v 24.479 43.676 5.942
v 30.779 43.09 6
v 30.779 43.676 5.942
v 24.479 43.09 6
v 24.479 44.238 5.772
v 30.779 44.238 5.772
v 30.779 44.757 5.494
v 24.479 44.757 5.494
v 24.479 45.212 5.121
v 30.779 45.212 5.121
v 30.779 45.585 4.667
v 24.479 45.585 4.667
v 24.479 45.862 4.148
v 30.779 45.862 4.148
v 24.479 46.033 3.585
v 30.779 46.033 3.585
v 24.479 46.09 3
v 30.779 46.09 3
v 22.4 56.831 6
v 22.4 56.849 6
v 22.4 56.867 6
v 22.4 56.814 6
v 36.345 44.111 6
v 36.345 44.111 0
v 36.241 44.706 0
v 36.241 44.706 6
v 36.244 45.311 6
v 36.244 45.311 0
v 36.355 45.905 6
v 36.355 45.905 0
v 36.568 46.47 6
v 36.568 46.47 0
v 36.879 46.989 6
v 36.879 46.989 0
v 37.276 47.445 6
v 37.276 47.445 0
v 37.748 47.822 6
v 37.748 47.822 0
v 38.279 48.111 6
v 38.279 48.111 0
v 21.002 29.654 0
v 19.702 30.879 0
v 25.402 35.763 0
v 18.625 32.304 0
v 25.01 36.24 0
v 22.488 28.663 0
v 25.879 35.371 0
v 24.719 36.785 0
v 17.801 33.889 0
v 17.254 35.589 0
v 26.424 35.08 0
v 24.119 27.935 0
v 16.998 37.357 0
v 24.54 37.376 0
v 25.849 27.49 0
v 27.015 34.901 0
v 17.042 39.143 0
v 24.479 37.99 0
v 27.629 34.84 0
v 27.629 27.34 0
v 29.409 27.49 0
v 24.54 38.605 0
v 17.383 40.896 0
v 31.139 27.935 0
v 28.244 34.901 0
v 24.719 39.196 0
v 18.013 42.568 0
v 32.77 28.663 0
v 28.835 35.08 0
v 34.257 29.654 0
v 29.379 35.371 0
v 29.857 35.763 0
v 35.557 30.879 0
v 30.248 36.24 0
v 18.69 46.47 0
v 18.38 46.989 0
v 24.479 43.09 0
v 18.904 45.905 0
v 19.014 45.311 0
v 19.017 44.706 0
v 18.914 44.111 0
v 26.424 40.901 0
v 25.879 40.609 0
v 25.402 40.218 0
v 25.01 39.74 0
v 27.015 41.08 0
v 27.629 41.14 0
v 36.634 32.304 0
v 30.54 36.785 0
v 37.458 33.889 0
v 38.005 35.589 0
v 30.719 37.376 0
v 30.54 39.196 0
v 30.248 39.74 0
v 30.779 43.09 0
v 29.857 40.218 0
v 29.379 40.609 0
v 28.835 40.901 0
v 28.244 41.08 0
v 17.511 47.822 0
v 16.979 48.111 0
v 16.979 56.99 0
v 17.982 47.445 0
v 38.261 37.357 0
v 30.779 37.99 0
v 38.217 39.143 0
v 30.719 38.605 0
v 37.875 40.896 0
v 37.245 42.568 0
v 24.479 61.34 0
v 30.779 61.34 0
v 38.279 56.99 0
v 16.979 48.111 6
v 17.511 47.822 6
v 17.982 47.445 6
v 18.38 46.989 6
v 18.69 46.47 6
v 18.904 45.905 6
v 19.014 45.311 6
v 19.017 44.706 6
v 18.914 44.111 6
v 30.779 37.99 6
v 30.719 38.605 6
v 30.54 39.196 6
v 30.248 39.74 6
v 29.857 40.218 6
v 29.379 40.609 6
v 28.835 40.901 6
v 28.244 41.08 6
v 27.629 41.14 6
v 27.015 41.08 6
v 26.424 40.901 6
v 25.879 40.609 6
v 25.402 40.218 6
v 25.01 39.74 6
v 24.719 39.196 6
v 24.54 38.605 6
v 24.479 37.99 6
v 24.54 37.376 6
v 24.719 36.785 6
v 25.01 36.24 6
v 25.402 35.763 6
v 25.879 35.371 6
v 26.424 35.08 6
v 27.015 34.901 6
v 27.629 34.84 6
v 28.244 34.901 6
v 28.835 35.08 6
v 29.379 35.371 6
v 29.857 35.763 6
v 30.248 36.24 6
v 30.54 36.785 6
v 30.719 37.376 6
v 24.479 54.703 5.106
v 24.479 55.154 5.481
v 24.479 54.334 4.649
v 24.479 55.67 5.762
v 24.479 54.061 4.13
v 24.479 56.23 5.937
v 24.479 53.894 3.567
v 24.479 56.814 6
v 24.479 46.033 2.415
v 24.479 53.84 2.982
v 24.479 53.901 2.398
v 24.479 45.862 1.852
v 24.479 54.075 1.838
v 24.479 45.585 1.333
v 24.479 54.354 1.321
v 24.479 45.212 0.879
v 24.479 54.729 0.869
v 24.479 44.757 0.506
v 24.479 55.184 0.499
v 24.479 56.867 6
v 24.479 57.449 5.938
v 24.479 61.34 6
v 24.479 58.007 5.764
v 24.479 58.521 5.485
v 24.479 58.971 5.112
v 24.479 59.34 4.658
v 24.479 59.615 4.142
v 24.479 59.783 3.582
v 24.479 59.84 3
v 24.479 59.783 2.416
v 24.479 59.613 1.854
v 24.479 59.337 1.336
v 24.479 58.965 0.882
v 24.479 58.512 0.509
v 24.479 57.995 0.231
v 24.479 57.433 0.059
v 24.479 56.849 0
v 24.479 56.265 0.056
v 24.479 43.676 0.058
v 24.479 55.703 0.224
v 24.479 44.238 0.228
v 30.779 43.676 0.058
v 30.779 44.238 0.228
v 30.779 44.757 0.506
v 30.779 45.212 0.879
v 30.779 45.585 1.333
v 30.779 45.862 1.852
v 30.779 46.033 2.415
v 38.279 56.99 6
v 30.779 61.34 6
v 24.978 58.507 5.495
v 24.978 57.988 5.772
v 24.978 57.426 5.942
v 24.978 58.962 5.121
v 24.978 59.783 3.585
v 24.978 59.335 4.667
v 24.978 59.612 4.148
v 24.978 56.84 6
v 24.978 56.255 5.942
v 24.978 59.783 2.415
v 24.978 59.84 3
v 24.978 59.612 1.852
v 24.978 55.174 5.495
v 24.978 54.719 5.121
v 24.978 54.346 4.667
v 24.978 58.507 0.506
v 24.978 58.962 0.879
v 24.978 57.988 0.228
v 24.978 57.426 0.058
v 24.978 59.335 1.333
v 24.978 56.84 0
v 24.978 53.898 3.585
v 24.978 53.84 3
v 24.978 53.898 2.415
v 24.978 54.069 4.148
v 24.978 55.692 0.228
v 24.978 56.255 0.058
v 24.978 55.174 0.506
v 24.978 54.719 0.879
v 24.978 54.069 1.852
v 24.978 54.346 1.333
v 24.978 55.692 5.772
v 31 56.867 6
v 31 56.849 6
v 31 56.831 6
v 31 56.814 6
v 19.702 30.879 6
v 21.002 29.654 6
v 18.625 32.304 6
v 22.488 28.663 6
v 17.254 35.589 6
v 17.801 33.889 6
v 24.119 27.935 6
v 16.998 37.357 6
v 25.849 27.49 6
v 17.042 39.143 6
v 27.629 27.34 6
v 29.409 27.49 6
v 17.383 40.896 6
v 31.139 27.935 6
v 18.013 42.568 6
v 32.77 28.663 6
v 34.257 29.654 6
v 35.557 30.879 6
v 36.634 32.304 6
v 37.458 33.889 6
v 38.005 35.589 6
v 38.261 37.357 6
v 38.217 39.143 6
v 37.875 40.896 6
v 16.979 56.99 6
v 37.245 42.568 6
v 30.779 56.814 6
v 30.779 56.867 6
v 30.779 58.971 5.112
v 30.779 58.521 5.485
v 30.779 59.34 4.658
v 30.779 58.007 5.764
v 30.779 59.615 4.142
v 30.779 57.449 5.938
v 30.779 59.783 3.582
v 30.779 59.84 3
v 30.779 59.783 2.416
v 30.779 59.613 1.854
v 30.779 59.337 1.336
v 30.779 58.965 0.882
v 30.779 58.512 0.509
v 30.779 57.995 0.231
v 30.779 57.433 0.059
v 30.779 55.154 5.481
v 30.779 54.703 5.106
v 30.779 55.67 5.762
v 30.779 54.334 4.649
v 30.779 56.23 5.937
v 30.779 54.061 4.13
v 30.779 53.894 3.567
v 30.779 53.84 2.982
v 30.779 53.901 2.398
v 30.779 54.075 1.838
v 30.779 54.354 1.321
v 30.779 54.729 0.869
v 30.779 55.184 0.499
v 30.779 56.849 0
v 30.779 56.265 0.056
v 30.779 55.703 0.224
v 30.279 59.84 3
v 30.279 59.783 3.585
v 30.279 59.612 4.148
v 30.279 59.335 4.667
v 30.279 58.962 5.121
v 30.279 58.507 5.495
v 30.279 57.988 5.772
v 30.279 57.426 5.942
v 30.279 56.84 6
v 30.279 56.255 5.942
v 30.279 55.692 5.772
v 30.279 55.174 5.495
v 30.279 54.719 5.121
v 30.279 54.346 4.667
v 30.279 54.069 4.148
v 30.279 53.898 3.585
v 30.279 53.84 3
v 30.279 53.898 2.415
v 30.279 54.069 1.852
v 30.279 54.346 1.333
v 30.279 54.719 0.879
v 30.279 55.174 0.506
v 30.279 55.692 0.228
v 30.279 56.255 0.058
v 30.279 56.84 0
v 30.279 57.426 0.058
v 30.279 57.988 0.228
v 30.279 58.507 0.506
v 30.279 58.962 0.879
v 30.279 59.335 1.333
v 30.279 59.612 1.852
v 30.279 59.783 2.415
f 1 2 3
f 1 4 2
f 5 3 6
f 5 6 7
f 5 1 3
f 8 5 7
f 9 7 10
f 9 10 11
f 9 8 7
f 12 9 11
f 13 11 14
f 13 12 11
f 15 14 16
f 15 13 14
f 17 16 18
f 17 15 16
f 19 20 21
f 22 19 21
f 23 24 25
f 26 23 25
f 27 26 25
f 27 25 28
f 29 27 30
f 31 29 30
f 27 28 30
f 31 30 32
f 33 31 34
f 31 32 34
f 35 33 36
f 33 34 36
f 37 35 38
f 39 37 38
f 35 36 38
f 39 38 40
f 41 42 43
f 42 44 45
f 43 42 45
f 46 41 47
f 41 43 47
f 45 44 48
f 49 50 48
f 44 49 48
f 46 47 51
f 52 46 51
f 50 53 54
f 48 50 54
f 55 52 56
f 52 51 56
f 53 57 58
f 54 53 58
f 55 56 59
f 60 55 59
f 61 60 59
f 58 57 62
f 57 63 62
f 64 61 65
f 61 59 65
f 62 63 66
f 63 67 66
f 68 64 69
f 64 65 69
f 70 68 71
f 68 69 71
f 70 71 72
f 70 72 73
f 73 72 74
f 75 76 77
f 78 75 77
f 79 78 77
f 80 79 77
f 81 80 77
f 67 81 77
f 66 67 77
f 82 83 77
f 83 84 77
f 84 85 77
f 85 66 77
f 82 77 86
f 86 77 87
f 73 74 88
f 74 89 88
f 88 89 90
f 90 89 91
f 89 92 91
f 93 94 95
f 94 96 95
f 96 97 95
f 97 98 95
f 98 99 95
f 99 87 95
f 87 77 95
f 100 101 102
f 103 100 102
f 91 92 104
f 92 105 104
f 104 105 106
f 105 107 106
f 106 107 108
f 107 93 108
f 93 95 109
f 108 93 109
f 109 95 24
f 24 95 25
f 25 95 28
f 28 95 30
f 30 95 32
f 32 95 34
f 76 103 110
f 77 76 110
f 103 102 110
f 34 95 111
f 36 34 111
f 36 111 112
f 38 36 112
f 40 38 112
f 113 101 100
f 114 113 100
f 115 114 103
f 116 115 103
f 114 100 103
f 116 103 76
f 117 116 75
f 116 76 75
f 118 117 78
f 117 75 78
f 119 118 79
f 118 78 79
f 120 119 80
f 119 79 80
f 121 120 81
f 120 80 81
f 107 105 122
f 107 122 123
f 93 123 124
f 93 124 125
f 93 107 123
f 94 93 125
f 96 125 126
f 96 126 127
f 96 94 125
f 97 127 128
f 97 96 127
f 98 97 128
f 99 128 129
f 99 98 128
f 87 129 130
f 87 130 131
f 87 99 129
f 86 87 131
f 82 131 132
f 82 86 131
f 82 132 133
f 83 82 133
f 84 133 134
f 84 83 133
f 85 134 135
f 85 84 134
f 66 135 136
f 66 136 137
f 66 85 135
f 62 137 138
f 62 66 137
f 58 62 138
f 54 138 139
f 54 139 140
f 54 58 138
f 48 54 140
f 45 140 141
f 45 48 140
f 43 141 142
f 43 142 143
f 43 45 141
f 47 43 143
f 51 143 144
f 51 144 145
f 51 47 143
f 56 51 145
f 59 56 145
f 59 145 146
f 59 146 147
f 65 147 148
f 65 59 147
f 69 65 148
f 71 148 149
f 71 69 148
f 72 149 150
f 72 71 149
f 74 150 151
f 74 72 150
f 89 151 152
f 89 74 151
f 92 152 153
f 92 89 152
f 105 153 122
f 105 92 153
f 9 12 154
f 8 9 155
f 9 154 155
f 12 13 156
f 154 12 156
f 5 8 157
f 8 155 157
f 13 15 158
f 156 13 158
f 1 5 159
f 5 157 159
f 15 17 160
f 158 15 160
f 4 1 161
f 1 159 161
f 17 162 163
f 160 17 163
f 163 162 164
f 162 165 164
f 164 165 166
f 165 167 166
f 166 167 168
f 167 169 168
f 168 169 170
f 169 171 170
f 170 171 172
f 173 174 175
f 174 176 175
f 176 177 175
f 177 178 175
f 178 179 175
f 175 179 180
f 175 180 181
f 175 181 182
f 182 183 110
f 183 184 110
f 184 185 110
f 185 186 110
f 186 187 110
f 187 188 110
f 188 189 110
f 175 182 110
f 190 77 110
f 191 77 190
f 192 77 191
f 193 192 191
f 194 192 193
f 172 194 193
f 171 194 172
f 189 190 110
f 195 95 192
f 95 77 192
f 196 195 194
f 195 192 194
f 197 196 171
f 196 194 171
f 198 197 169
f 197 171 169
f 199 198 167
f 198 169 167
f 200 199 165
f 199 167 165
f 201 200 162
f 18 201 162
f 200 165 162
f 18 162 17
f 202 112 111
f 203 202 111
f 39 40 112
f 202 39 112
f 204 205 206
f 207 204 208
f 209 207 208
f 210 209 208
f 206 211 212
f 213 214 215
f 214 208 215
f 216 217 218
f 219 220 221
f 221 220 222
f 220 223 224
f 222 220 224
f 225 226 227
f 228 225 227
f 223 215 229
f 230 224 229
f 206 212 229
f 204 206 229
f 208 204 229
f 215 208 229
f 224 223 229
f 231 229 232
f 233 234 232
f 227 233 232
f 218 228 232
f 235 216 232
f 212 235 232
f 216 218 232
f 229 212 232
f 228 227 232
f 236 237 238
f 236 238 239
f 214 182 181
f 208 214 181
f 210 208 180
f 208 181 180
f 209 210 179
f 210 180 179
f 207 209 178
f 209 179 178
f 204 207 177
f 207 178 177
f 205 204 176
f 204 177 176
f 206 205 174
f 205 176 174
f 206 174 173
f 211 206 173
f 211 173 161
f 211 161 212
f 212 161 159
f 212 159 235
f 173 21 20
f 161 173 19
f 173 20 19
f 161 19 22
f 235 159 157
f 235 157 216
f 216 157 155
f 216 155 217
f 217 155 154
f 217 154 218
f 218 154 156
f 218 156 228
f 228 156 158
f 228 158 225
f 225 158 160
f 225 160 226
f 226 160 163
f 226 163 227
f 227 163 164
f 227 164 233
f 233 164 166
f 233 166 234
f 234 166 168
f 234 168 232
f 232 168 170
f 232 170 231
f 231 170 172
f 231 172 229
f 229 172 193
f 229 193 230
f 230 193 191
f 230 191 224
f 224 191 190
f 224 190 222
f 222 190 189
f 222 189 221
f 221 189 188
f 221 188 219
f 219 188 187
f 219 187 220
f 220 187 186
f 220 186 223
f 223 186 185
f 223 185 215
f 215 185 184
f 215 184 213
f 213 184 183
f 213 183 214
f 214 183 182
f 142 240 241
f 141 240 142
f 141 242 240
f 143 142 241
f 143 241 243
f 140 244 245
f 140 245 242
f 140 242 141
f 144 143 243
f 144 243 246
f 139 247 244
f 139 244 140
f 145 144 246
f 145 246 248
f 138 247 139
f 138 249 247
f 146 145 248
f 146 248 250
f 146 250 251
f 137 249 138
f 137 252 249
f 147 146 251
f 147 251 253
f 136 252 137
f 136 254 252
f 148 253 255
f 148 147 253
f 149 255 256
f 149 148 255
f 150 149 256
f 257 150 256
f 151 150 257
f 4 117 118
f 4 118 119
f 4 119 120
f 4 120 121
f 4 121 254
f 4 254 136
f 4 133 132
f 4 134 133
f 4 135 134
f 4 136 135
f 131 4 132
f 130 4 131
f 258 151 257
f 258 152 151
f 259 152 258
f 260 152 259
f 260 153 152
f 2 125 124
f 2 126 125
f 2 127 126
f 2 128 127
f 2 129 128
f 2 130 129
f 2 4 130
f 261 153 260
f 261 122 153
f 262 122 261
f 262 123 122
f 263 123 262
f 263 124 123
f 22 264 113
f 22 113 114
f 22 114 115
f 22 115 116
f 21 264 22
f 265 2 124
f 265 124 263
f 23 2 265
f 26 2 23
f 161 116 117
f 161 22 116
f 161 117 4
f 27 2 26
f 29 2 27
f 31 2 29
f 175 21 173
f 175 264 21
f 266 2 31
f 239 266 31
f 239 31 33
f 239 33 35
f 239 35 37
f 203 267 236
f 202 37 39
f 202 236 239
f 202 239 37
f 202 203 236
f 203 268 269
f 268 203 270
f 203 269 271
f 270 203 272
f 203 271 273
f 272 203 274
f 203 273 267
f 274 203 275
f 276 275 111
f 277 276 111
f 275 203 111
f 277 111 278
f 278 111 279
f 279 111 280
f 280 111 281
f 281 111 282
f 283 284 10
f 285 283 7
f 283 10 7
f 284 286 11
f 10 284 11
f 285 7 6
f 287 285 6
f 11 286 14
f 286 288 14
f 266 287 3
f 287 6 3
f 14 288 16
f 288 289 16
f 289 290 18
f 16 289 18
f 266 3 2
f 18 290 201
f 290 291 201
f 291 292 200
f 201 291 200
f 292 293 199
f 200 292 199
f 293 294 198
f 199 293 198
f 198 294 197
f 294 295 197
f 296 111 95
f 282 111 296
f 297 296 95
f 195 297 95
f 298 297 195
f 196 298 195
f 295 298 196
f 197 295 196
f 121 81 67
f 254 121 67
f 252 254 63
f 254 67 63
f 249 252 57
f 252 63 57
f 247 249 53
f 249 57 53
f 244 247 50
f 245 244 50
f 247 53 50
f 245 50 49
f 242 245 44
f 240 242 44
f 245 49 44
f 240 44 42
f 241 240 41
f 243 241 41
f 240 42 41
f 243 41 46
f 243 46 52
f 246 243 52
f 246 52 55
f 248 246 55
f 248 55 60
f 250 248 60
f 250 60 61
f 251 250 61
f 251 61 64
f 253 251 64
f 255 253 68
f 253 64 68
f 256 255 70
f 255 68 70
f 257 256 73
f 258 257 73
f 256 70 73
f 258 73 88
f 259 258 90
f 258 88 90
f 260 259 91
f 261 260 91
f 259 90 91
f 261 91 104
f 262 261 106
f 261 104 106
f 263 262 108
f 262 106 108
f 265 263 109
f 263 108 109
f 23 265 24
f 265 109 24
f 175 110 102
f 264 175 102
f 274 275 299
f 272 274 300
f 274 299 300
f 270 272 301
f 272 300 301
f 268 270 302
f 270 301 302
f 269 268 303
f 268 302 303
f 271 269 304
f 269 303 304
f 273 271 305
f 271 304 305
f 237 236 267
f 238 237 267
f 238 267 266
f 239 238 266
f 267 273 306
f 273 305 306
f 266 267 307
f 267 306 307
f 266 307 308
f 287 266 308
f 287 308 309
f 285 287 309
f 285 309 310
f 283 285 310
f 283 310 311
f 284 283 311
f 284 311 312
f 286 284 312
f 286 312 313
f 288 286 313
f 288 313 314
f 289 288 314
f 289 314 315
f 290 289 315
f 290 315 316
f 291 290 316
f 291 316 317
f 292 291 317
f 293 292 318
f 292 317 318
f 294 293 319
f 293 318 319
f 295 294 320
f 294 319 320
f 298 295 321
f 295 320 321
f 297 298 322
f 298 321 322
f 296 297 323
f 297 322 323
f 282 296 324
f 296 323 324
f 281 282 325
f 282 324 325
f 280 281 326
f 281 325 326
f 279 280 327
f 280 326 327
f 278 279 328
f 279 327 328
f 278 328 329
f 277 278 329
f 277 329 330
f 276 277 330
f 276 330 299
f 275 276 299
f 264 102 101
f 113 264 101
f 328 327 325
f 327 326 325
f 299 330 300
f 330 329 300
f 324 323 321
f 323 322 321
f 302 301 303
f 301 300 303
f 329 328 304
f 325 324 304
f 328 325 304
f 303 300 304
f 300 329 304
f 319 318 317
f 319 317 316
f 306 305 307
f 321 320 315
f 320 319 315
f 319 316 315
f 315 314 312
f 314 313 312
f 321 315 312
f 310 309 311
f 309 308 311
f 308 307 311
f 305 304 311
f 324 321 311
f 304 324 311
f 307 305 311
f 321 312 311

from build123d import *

# Parameters (mm, degrees)
F0_R     = 3.15
F1_DEPTH = 6
F3_START = 22.4
F2_R     = 3
F3_DEPTH = 8.6
F5_START = -52.7
F5_DEPTH = 11
F6_R     = 3
F7_R     = 2.99999


# Not quite as in the source:
# - a fillet or chamfer is up to 0.001 mm smaller than in the source, because OpenCascade refuses the exact size


with BuildPart() as f1:
    # F0 (on Top) → F1 (new body)
    with BuildSketch(Plane.XY):
        with BuildLine():
            Line((24.4793512434, 46.0903614521), (24.4793512434, 48.1638564268))
            ThreePointArc((24.4793512434, 48.1638564268), (21.3598687714, 46.599431642), (18.9135639574, 44.1106189618))
            ThreePointArc((18.9135639574, 44.1106189618), (27.6293512434, 27.3403614521), (36.3451385294, 44.1106189618))
            ThreePointArc((36.3451385294, 44.1106189618), (33.8988337153, 46.599431642), (30.7793512434, 48.1638564268))
            Line((30.7793512434, 48.1638564268), (30.7793512434, 46.0903614521))
            Line((30.7793512434, 46.0903614521), (27.6293512434, 46.0903614521))
            Line((27.6293512434, 46.0903614521), (24.4793512434, 46.0903614521))
        make_face()
        with Locations((27.6293512434, 37.9903614521)):
            Circle(F0_R, mode=Mode.SUBTRACT)
        with BuildLine():
            ThreePointArc((18.9135639574, 44.1106189618), (21.3598687714, 46.599431642), (24.4793512434, 48.1638564268))
            Line((24.4793512434, 48.1638564268), (24.4793512434, 61.3403614521))
            Line((24.4793512434, 61.3403614521), (16.9793512434, 56.9903614521))
            Line((16.9793512434, 56.9903614521), (16.9793512434, 48.1108582074))
            ThreePointArc((16.9793512434, 48.1108582074), (18.6903086712, 46.4704086219), (18.9135639574, 44.1106189618))
        make_face()
        with BuildLine():
            ThreePointArc((30.7793512434, 48.1638564268), (33.8988337153, 46.599431642), (36.3451385294, 44.1106189618))
            ThreePointArc((36.3451385294, 44.1106189618), (36.5683938155, 46.4704086219), (38.2793512434, 48.1108582074))
            Line((38.2793512434, 48.1108582074), (38.2793512434, 56.9903614521))
            Line((38.2793512434, 56.9903614521), (30.7793512434, 61.3403614521))
            Line((30.7793512434, 61.3403614521), (30.7793512434, 48.1638564268))
        make_face()
    extrude(amount=F1_DEPTH)

    # F2 (on Right) → F3 (join)
    with BuildSketch(Plane.YZ.offset(F3_START)):
        with Locations((56.8403841853, 3.0001187697)):
            Circle(F2_R)
    extrude(amount=F3_DEPTH)

    # F4 (on Front) → F5 (cut)
    with BuildSketch(Plane.XZ.offset(F5_START)):
        Polygon((30.2794827968, -0.6592939026), (30.2794827968, 3.0006368179), (30.2794827968, 6.7412233911), (24.9780313224, 6.7412233911), (24.9780313224, -0.6592939026), align=None)
    extrude(amount=-F5_DEPTH, mode=Mode.SUBTRACT)

    # F6
    f6_edges = [f1.edges().sort_by_distance(p)[0] for p in [
        (27.629351, 46.090361, 6),
    ]]
    fillet(f6_edges, radius=F6_R)

    # F7 (radius 3 in the source; OpenCascade refuses exactly that, so slightly less here)
    f7_edges = [f1.edges().sort_by_distance(p)[0] for p in [
        (27.629351, 46.090361, 0),
    ]]
    fillet(f7_edges, radius=F7_R)


solid = f1.part
